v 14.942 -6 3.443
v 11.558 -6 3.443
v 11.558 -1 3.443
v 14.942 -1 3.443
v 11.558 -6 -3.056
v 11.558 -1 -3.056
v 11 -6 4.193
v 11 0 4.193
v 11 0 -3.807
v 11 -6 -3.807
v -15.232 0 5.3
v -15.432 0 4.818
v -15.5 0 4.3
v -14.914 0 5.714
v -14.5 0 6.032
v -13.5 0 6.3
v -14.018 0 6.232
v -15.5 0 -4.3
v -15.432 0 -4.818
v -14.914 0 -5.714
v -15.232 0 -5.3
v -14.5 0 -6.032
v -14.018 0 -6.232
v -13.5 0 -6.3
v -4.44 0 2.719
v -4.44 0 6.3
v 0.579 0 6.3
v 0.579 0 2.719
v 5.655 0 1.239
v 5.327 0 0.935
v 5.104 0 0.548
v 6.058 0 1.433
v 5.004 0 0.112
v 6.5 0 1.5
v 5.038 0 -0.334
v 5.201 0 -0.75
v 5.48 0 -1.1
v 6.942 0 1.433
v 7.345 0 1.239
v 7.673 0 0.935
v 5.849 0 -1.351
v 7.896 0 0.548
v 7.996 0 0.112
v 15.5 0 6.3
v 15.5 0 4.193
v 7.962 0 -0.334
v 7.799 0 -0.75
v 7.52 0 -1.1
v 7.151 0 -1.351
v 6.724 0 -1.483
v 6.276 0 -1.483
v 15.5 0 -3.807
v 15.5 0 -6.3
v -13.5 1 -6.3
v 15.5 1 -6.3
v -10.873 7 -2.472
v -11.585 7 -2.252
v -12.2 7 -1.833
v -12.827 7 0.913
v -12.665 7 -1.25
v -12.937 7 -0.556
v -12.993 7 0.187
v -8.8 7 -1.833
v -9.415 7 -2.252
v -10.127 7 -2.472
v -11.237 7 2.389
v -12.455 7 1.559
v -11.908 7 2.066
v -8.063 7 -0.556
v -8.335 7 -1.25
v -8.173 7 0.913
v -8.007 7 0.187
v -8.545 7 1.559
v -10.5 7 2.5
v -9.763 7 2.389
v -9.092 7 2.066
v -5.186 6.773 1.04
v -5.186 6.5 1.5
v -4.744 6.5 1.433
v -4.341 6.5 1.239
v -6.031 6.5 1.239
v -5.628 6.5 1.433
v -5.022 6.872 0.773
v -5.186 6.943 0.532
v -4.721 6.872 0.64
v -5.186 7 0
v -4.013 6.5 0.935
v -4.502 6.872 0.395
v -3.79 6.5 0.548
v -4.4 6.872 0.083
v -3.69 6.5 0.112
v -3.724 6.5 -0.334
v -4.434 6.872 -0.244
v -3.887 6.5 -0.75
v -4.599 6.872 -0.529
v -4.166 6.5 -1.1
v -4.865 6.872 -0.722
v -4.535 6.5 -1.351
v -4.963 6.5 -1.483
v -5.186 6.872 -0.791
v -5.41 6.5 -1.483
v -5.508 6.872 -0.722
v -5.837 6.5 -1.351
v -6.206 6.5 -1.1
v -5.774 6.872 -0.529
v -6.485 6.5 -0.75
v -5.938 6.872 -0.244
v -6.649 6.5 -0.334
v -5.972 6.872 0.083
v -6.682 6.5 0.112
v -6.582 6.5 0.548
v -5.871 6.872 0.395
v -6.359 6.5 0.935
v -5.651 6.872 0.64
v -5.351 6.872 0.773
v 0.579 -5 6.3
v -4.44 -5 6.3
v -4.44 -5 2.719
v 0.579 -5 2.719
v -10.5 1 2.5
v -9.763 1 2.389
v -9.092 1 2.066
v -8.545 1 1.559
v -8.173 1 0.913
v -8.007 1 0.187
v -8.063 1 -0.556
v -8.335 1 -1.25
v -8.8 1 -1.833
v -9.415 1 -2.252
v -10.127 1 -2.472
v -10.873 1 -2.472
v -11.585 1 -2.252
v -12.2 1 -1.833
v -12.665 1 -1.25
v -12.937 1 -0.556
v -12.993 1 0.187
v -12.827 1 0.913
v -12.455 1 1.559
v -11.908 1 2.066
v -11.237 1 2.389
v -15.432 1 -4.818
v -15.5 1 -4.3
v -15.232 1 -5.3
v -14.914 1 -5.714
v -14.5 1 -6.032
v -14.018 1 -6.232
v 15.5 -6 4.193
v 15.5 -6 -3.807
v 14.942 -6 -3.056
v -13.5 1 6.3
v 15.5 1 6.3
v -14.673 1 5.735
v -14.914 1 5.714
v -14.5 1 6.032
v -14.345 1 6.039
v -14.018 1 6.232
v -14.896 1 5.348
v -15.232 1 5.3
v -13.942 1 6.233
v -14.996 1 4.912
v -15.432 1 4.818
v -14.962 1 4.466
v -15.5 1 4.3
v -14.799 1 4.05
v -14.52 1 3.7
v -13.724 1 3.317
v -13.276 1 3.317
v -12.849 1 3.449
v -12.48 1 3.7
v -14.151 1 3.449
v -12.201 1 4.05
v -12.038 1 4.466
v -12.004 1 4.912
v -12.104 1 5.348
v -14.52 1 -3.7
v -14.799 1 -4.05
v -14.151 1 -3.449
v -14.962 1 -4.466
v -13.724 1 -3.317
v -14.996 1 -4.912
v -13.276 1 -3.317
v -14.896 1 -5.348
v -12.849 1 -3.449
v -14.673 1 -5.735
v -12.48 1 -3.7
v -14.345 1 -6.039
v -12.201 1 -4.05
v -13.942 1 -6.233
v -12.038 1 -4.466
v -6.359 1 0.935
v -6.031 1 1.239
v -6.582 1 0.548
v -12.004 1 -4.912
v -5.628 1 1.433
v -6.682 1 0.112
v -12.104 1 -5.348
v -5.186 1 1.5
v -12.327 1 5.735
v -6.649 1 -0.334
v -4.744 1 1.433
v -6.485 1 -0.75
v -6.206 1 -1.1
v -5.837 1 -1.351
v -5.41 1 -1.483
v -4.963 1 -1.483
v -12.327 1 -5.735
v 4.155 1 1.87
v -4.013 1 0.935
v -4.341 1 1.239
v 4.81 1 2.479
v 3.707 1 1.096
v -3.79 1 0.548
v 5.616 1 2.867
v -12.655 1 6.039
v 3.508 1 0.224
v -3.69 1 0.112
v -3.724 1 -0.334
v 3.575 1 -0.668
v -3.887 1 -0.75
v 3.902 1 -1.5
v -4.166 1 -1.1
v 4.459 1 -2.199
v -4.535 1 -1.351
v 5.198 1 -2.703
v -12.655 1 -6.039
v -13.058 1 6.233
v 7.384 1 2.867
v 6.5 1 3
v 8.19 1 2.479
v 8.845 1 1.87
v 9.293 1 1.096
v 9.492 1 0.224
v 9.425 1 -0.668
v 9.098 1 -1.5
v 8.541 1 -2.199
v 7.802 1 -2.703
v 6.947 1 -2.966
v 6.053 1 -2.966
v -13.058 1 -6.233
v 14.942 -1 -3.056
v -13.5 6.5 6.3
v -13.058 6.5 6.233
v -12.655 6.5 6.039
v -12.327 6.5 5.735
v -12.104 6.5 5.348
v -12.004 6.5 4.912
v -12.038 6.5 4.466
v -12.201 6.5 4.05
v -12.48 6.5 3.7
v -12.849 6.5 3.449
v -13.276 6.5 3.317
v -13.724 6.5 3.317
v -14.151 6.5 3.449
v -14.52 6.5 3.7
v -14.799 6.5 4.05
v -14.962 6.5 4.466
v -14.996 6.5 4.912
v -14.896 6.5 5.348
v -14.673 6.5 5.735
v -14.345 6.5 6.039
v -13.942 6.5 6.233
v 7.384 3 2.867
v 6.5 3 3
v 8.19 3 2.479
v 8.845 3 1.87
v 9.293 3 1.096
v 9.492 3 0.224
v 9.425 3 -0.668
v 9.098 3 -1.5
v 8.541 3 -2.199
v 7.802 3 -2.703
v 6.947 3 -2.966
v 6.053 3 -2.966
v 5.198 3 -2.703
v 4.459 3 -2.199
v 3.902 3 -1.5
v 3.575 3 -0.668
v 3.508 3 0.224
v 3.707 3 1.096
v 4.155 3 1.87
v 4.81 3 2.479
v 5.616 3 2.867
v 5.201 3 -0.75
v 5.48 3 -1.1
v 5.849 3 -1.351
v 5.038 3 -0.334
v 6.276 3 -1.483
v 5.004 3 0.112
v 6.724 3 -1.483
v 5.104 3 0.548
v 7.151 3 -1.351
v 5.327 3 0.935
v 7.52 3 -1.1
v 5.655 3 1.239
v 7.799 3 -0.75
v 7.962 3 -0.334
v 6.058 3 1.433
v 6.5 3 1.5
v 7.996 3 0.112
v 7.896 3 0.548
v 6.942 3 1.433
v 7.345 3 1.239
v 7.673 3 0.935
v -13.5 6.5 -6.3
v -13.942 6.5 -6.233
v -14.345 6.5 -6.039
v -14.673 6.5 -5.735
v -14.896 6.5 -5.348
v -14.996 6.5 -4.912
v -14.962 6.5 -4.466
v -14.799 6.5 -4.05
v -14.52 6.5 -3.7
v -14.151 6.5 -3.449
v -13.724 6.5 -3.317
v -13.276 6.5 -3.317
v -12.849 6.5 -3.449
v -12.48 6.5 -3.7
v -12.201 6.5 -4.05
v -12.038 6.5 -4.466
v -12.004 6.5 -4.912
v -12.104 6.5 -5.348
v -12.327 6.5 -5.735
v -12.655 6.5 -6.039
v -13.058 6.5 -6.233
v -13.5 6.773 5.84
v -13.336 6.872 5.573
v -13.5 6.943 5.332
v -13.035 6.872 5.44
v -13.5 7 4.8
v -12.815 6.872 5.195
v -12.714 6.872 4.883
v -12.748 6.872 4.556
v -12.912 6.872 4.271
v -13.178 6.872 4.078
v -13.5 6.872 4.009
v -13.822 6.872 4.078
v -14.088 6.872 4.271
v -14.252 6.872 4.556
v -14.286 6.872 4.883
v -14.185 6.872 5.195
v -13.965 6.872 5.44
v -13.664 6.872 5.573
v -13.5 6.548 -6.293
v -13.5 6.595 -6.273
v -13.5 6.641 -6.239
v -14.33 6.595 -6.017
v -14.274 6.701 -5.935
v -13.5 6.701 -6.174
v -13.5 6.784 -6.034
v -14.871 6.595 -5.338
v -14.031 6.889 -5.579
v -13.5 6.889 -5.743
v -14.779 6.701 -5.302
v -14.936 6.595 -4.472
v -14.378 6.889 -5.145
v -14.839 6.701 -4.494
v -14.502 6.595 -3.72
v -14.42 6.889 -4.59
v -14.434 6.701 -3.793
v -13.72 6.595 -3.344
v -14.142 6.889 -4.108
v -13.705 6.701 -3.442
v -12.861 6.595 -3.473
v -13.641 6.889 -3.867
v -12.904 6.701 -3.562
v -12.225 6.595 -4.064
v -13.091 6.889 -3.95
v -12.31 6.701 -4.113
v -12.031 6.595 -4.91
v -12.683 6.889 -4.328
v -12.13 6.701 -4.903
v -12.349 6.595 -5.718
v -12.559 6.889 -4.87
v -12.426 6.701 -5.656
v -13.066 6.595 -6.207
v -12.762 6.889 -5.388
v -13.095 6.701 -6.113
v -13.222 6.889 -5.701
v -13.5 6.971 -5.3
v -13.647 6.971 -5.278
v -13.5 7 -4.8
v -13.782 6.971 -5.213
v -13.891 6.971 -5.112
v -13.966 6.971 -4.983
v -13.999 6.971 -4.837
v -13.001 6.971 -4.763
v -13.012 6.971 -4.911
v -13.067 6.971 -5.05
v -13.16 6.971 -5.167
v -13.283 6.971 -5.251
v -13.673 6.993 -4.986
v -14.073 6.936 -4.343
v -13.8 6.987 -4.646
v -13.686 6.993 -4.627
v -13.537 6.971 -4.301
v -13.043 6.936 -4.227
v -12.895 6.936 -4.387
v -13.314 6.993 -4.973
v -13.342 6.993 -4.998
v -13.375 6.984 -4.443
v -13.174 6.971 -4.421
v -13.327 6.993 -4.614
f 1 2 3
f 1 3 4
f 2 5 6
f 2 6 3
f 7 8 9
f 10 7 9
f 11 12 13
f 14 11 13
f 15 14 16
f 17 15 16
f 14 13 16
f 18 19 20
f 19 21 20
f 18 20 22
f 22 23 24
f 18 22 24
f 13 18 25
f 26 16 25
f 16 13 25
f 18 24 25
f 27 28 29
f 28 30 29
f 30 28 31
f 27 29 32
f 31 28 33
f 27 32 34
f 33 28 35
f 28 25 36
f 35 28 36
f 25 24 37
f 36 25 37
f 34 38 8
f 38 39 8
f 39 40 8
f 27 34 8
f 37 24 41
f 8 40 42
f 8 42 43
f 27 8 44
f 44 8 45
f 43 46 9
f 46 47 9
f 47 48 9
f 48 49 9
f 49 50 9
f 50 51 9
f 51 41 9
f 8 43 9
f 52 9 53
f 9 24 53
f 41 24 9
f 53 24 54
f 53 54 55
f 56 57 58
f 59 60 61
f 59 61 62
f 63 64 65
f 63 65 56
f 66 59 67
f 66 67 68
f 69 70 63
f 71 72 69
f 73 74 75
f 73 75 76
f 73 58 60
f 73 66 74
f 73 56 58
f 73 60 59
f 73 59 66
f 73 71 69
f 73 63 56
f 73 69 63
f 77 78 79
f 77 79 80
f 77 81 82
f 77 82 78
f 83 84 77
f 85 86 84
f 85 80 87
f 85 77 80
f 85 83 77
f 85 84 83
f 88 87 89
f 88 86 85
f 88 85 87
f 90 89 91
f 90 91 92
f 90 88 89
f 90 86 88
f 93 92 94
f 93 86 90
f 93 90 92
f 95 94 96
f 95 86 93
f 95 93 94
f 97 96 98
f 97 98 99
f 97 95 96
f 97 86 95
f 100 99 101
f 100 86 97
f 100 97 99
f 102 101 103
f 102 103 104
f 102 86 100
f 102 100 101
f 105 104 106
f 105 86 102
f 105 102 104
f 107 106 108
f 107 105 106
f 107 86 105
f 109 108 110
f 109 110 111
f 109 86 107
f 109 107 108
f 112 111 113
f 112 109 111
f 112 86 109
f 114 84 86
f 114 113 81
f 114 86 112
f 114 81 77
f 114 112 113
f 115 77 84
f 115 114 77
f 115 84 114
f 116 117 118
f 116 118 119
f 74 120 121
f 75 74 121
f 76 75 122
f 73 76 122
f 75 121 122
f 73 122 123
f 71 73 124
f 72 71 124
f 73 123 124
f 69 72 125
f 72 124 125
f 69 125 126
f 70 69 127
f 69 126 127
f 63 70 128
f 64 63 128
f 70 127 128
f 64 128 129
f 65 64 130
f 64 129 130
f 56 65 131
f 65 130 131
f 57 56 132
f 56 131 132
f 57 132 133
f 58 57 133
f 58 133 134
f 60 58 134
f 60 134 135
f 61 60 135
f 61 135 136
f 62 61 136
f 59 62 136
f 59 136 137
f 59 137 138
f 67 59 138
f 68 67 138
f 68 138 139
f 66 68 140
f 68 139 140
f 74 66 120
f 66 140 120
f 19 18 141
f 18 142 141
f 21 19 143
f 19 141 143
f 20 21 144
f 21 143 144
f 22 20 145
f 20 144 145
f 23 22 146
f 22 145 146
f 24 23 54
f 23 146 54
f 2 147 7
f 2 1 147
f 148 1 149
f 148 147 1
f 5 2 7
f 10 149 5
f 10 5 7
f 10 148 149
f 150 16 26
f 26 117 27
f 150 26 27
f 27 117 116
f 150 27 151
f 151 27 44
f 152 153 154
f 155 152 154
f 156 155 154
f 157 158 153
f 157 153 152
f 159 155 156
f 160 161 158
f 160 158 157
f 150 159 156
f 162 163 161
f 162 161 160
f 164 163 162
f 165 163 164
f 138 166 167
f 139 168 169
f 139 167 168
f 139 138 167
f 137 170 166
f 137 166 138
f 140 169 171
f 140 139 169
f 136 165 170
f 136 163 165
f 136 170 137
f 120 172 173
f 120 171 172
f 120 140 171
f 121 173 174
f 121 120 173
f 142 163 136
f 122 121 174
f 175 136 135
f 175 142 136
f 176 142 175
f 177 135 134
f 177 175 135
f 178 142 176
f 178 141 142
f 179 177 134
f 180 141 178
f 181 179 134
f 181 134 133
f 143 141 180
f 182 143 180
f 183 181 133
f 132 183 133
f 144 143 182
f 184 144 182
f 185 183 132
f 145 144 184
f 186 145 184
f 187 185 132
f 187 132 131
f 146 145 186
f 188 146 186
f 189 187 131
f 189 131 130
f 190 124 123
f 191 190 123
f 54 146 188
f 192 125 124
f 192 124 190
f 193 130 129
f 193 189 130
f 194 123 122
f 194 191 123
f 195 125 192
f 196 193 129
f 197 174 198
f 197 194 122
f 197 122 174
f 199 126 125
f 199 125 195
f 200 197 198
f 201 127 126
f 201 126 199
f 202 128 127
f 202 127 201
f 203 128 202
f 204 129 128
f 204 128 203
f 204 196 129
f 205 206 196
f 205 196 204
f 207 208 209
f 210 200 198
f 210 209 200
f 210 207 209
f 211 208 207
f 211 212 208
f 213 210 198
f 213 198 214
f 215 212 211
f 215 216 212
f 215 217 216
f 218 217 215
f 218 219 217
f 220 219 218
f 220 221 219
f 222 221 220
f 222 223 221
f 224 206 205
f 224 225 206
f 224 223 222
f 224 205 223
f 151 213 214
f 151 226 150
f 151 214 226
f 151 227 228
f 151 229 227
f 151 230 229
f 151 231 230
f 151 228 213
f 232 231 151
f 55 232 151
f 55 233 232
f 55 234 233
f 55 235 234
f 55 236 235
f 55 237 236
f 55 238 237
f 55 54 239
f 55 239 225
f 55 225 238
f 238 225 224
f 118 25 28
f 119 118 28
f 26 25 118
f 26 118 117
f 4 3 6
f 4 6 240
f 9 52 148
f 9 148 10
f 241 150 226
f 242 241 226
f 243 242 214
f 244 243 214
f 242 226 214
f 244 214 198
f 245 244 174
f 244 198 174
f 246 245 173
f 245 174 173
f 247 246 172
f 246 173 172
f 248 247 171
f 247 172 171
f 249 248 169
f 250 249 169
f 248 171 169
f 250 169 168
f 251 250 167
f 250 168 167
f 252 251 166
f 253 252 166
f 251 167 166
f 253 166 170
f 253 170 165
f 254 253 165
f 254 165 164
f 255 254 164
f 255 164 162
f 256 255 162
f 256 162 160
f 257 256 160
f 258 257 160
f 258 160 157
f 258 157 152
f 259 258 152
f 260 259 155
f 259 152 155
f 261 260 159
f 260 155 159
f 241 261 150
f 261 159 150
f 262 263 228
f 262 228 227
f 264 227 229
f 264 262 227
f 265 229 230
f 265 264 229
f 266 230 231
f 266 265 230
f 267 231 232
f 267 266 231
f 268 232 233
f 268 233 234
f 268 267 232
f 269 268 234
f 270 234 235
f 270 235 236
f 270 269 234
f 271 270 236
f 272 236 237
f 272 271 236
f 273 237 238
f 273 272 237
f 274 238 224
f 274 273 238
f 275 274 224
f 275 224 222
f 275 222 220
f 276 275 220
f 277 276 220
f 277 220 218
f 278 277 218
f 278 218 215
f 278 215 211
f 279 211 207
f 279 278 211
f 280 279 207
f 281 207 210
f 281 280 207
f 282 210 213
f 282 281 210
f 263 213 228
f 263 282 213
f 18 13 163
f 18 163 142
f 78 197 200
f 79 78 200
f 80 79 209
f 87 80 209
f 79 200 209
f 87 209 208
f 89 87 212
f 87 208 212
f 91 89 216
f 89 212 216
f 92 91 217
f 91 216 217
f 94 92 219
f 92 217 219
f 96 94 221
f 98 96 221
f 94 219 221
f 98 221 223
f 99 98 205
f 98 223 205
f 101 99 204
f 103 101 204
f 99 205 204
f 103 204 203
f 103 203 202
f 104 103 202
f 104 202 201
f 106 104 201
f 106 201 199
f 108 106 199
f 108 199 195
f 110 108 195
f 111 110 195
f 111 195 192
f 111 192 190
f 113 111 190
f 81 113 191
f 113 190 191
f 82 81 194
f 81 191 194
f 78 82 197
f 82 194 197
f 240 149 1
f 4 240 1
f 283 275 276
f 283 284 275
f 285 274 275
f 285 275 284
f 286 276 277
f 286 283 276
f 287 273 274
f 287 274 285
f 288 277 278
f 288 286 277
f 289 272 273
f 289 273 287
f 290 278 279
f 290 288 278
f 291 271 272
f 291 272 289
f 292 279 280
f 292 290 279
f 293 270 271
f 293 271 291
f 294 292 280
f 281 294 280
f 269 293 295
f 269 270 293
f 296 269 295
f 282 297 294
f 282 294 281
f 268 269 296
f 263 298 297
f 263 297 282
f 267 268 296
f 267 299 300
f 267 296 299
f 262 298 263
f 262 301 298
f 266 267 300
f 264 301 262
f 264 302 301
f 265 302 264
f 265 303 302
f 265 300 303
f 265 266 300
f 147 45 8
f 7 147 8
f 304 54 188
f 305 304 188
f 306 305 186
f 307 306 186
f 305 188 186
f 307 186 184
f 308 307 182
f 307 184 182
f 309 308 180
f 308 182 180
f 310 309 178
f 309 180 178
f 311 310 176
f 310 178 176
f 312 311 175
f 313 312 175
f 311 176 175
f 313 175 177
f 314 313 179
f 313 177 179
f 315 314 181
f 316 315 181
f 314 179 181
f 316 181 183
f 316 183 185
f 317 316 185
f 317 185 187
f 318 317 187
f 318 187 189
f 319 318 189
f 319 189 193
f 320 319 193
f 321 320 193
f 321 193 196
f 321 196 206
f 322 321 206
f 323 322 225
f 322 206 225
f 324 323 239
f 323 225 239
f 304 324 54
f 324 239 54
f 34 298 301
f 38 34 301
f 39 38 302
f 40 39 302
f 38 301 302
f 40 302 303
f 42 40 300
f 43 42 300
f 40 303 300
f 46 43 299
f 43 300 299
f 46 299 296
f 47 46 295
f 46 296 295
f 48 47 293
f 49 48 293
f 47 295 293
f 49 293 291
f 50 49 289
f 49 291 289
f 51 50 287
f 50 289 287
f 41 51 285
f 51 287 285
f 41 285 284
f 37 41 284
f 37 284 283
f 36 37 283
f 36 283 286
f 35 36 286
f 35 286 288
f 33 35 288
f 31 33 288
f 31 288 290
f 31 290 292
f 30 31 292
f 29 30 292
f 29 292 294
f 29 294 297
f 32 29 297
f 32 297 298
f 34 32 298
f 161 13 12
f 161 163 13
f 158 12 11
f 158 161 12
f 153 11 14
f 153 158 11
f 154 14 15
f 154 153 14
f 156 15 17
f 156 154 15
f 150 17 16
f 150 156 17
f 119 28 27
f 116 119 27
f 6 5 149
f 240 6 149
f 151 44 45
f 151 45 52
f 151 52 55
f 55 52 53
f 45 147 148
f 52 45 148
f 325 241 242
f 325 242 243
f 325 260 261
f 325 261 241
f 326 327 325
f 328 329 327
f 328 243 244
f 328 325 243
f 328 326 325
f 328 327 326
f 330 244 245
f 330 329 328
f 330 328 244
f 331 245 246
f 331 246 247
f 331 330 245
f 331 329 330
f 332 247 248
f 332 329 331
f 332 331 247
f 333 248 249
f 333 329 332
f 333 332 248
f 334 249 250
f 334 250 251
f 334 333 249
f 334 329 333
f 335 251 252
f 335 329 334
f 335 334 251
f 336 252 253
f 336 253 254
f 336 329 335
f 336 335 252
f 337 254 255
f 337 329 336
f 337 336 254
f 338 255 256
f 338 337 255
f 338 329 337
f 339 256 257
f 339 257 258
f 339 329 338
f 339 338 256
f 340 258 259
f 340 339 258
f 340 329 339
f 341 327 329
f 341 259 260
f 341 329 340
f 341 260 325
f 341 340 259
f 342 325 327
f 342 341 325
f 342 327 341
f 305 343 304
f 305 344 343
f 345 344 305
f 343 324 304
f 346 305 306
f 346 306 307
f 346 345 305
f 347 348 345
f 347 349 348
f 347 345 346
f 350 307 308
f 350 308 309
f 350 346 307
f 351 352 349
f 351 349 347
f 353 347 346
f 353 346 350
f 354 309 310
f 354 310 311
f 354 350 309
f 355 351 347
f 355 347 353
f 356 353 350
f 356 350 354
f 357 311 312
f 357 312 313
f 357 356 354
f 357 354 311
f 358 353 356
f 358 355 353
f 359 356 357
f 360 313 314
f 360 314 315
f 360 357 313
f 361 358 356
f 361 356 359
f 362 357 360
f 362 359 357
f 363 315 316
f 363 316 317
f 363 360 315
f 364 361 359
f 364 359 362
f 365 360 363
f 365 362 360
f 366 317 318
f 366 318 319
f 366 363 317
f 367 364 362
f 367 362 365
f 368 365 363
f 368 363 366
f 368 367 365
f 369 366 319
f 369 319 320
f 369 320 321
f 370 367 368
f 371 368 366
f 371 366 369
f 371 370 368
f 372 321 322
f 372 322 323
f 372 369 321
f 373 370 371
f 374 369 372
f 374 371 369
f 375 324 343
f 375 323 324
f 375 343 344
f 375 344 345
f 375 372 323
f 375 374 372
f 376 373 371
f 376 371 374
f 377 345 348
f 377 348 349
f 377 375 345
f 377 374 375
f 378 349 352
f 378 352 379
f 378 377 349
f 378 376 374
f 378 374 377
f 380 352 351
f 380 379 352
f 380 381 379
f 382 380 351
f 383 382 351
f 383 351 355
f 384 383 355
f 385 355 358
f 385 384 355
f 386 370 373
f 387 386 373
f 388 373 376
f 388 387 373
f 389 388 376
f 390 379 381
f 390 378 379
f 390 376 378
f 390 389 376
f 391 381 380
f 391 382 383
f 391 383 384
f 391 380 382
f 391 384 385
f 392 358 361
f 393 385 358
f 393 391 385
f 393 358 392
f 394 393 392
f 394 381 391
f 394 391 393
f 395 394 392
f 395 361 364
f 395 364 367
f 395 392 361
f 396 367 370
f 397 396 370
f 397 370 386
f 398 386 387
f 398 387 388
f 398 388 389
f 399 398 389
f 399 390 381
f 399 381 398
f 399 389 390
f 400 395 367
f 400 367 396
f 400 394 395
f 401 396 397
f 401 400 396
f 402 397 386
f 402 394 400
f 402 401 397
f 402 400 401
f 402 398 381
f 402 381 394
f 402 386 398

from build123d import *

# Parameters (mm, degrees)
SKETCH_1_W          = 31
SKETCH_1_H          = 12.6
EXTRUDE_1_DEPTH     = 1
SKETCH_2_R          = 2.5
EXTRUDE_2_DEPTH     = 6
SKETCH_3_R          = 1.5
EXTRUDE_3_DEPTH     = 5.5
DOME_1_FACE_RADIUS  = 1.5
DOME_1_HEIGHT       = 0.5
DOME_2_FACE_RADIUS  = 1.5
DOME_2_HEIGHT       = 0.5
DOME_3_FACE_RADIUS  = 1.5
DOME_3_HEIGHT       = 0.5
SKETCH_4_R          = 1.5
CUT_EXTRUDE_1_DEPTH = 18.774701192
EXTRUDE_START       = 2
SKETCH_5_R          = 3
SKETCH_5_R_2        = 1.5
EXTRUDE_4_DEPTH     = 2
SKETCH_6_W          = 4.5
SKETCH_6_H          = 8
EXTRUDE_6_DEPTH     = 6
SKETCH_7_W          = 3.38323666
SKETCH_7_H          = 6.498483094
CUT_EXTRUDE_2_DEPTH = 5
FILLET_1_R          = 2
SKETCH_9_W          = 5.019385781
SKETCH_9_H          = 3.581166035
EXTRUDE_7_DEPTH     = 5


with BuildPart() as part:
    # 草图1 → 凸台-拉伸1 (new body)
    with BuildSketch(Plane(origin=(0, 0, 0), x_dir=(1, 0, 0), z_dir=(0, 1, 0))):
        Rectangle(SKETCH_1_W, SKETCH_1_H)
    extrude(amount=EXTRUDE_1_DEPTH)

    # 草图2 → 凸台-拉伸2 (add)
    with BuildSketch(Plane(origin=(0, 1, 0), x_dir=(1, 0, 0), z_dir=(0, 1, 0))):
        with Locations(Location((-10.5, 0, 0), (0, 0, 270))):
            Circle(SKETCH_2_R)
    extrude(amount=EXTRUDE_2_DEPTH)

    # 草图3 → 凸台-拉伸3 (add)
    with BuildSketch(Plane(origin=(0, 1, 0), x_dir=(1, 0, 0), z_dir=(0, 1, 0))):
        with Locations(Location((-13.5, -4.8, 0), (0, 0, 270))):
            Circle(SKETCH_3_R)
        with Locations(Location((-13.5, 4.8, 0), (0, 0, 90))):
            Circle(SKETCH_3_R)
        with Locations(Location((-5.186156124, 0, 0), (0, 0, 270))):
            Circle(SKETCH_3_R)
    extrude(amount=EXTRUDE_3_DEPTH)

    # 圆顶1: an elliptical dome of height H over a round flat face of radius A is half a spheroid: the quarter ellipse of half axes A and H revolved about the face's axis
    with BuildSketch(Plane((-13.5, 6.5, -4.8), x_dir=(0, 0, -1), z_dir=(1, 0, 0)), mode=Mode.PRIVATE) as dome_1_quarter:
        Ellipse(DOME_1_FACE_RADIUS, DOME_1_HEIGHT)
        Rectangle(DOME_1_FACE_RADIUS, DOME_1_HEIGHT, align=(Align.MIN, Align.MIN), mode=Mode.INTERSECT)
    revolve(dome_1_quarter.sketch, axis=Axis((-13.5, 6.5, -4.8), (0, 1, 0)))

    # 圆顶2: a dome of height H over a round flat face of radius A is a cap of a sphere of radius (A * A + H * H) / (2 * H)
    dome_2_r = (DOME_2_FACE_RADIUS * DOME_2_FACE_RADIUS + DOME_2_HEIGHT * DOME_2_HEIGHT) / (2 * DOME_2_HEIGHT)
    dome_2_base = Plane((-13.5, 6.5, 4.8), z_dir=(0, 1, 0))
    with Locations(dome_2_base.offset(DOME_2_HEIGHT - dome_2_r)):
        dome_2_ball = Sphere(dome_2_r, mode=Mode.PRIVATE)
    add(split(dome_2_ball, bisect_by=dome_2_base, keep=Keep.TOP, mode=Mode.PRIVATE))

    # 圆顶3: a dome of height H over a round flat face of radius A is a cap of a sphere of radius (A * A + H * H) / (2 * H)
    dome_3_r = (DOME_3_FACE_RADIUS * DOME_3_FACE_RADIUS + DOME_3_HEIGHT * DOME_3_HEIGHT) / (2 * DOME_3_HEIGHT)
    dome_3_base = Plane((-5.186156124, 6.5, 0), z_dir=(0, 1, 0))
    with Locations(dome_3_base.offset(DOME_3_HEIGHT - dome_3_r)):
        dome_3_ball = Sphere(dome_3_r, mode=Mode.PRIVATE)
    add(split(dome_3_ball, bisect_by=dome_3_base, keep=Keep.TOP, mode=Mode.PRIVATE))

    # 草图4 → 切除-拉伸1 (cut, through all)
    with BuildSketch(Plane(origin=(0, 1, 0), x_dir=(1, 0, 0), z_dir=(0, 1, 0))):
        with Locations(Location((6.5, 0, 0), (0, 0, 270))):
            Circle(SKETCH_4_R)
    extrude(amount=-CUT_EXTRUDE_1_DEPTH, mode=Mode.SUBTRACT)

    # 草图5 → 凸台-拉伸4 (add)
    with BuildSketch(Plane(origin=(0, 1, 0), x_dir=(1, 0, 0), z_dir=(0, 1, 0)).offset(EXTRUDE_START)):
        with Locations(Location((6.5, 0, 0), (0, 0, 270))):
            Circle(SKETCH_5_R)
        with Locations(Location((6.5, 0, 0), (0, 0, 270))):
            Circle(SKETCH_5_R_2, mode=Mode.SUBTRACT)
    extrude(amount=-EXTRUDE_4_DEPTH)

    # 草图6 → 凸台-拉伸6 (add)
    with BuildSketch(Plane(origin=(0, 0, 0), x_dir=(-1, 0, 0), z_dir=(0, -1, 0))):
        with Locations((-13.25, -0.193431005)):
            Rectangle(SKETCH_6_W, SKETCH_6_H)
    extrude(amount=EXTRUDE_6_DEPTH)

    # 草图7 → 切除-拉伸2 (cut)
    with BuildSketch(Plane.XZ.offset(6)):
        with Locations((13.25, 0.193431005)):
            Rectangle(SKETCH_7_W, SKETCH_7_H)
    extrude(amount=-CUT_EXTRUDE_2_DEPTH, mode=Mode.SUBTRACT)

    # 圆角1
    fillet_1_edges = [part.edges().sort_by_distance(p)[0] for p in [
        (-15.5, 0.5, -6.3),
        (-15.5, 0.5, 6.3),
    ]]
    fillet(fillet_1_edges, radius=FILLET_1_R)

    # 草图9 → 凸台-拉伸7 (add)
    with BuildSketch(Plane.XZ):
        with Locations((-1.930507992, 4.509416983)):
            Rectangle(SKETCH_9_W, SKETCH_9_H)
    extrude(amount=EXTRUDE_7_DEPTH)


solid = part.part
